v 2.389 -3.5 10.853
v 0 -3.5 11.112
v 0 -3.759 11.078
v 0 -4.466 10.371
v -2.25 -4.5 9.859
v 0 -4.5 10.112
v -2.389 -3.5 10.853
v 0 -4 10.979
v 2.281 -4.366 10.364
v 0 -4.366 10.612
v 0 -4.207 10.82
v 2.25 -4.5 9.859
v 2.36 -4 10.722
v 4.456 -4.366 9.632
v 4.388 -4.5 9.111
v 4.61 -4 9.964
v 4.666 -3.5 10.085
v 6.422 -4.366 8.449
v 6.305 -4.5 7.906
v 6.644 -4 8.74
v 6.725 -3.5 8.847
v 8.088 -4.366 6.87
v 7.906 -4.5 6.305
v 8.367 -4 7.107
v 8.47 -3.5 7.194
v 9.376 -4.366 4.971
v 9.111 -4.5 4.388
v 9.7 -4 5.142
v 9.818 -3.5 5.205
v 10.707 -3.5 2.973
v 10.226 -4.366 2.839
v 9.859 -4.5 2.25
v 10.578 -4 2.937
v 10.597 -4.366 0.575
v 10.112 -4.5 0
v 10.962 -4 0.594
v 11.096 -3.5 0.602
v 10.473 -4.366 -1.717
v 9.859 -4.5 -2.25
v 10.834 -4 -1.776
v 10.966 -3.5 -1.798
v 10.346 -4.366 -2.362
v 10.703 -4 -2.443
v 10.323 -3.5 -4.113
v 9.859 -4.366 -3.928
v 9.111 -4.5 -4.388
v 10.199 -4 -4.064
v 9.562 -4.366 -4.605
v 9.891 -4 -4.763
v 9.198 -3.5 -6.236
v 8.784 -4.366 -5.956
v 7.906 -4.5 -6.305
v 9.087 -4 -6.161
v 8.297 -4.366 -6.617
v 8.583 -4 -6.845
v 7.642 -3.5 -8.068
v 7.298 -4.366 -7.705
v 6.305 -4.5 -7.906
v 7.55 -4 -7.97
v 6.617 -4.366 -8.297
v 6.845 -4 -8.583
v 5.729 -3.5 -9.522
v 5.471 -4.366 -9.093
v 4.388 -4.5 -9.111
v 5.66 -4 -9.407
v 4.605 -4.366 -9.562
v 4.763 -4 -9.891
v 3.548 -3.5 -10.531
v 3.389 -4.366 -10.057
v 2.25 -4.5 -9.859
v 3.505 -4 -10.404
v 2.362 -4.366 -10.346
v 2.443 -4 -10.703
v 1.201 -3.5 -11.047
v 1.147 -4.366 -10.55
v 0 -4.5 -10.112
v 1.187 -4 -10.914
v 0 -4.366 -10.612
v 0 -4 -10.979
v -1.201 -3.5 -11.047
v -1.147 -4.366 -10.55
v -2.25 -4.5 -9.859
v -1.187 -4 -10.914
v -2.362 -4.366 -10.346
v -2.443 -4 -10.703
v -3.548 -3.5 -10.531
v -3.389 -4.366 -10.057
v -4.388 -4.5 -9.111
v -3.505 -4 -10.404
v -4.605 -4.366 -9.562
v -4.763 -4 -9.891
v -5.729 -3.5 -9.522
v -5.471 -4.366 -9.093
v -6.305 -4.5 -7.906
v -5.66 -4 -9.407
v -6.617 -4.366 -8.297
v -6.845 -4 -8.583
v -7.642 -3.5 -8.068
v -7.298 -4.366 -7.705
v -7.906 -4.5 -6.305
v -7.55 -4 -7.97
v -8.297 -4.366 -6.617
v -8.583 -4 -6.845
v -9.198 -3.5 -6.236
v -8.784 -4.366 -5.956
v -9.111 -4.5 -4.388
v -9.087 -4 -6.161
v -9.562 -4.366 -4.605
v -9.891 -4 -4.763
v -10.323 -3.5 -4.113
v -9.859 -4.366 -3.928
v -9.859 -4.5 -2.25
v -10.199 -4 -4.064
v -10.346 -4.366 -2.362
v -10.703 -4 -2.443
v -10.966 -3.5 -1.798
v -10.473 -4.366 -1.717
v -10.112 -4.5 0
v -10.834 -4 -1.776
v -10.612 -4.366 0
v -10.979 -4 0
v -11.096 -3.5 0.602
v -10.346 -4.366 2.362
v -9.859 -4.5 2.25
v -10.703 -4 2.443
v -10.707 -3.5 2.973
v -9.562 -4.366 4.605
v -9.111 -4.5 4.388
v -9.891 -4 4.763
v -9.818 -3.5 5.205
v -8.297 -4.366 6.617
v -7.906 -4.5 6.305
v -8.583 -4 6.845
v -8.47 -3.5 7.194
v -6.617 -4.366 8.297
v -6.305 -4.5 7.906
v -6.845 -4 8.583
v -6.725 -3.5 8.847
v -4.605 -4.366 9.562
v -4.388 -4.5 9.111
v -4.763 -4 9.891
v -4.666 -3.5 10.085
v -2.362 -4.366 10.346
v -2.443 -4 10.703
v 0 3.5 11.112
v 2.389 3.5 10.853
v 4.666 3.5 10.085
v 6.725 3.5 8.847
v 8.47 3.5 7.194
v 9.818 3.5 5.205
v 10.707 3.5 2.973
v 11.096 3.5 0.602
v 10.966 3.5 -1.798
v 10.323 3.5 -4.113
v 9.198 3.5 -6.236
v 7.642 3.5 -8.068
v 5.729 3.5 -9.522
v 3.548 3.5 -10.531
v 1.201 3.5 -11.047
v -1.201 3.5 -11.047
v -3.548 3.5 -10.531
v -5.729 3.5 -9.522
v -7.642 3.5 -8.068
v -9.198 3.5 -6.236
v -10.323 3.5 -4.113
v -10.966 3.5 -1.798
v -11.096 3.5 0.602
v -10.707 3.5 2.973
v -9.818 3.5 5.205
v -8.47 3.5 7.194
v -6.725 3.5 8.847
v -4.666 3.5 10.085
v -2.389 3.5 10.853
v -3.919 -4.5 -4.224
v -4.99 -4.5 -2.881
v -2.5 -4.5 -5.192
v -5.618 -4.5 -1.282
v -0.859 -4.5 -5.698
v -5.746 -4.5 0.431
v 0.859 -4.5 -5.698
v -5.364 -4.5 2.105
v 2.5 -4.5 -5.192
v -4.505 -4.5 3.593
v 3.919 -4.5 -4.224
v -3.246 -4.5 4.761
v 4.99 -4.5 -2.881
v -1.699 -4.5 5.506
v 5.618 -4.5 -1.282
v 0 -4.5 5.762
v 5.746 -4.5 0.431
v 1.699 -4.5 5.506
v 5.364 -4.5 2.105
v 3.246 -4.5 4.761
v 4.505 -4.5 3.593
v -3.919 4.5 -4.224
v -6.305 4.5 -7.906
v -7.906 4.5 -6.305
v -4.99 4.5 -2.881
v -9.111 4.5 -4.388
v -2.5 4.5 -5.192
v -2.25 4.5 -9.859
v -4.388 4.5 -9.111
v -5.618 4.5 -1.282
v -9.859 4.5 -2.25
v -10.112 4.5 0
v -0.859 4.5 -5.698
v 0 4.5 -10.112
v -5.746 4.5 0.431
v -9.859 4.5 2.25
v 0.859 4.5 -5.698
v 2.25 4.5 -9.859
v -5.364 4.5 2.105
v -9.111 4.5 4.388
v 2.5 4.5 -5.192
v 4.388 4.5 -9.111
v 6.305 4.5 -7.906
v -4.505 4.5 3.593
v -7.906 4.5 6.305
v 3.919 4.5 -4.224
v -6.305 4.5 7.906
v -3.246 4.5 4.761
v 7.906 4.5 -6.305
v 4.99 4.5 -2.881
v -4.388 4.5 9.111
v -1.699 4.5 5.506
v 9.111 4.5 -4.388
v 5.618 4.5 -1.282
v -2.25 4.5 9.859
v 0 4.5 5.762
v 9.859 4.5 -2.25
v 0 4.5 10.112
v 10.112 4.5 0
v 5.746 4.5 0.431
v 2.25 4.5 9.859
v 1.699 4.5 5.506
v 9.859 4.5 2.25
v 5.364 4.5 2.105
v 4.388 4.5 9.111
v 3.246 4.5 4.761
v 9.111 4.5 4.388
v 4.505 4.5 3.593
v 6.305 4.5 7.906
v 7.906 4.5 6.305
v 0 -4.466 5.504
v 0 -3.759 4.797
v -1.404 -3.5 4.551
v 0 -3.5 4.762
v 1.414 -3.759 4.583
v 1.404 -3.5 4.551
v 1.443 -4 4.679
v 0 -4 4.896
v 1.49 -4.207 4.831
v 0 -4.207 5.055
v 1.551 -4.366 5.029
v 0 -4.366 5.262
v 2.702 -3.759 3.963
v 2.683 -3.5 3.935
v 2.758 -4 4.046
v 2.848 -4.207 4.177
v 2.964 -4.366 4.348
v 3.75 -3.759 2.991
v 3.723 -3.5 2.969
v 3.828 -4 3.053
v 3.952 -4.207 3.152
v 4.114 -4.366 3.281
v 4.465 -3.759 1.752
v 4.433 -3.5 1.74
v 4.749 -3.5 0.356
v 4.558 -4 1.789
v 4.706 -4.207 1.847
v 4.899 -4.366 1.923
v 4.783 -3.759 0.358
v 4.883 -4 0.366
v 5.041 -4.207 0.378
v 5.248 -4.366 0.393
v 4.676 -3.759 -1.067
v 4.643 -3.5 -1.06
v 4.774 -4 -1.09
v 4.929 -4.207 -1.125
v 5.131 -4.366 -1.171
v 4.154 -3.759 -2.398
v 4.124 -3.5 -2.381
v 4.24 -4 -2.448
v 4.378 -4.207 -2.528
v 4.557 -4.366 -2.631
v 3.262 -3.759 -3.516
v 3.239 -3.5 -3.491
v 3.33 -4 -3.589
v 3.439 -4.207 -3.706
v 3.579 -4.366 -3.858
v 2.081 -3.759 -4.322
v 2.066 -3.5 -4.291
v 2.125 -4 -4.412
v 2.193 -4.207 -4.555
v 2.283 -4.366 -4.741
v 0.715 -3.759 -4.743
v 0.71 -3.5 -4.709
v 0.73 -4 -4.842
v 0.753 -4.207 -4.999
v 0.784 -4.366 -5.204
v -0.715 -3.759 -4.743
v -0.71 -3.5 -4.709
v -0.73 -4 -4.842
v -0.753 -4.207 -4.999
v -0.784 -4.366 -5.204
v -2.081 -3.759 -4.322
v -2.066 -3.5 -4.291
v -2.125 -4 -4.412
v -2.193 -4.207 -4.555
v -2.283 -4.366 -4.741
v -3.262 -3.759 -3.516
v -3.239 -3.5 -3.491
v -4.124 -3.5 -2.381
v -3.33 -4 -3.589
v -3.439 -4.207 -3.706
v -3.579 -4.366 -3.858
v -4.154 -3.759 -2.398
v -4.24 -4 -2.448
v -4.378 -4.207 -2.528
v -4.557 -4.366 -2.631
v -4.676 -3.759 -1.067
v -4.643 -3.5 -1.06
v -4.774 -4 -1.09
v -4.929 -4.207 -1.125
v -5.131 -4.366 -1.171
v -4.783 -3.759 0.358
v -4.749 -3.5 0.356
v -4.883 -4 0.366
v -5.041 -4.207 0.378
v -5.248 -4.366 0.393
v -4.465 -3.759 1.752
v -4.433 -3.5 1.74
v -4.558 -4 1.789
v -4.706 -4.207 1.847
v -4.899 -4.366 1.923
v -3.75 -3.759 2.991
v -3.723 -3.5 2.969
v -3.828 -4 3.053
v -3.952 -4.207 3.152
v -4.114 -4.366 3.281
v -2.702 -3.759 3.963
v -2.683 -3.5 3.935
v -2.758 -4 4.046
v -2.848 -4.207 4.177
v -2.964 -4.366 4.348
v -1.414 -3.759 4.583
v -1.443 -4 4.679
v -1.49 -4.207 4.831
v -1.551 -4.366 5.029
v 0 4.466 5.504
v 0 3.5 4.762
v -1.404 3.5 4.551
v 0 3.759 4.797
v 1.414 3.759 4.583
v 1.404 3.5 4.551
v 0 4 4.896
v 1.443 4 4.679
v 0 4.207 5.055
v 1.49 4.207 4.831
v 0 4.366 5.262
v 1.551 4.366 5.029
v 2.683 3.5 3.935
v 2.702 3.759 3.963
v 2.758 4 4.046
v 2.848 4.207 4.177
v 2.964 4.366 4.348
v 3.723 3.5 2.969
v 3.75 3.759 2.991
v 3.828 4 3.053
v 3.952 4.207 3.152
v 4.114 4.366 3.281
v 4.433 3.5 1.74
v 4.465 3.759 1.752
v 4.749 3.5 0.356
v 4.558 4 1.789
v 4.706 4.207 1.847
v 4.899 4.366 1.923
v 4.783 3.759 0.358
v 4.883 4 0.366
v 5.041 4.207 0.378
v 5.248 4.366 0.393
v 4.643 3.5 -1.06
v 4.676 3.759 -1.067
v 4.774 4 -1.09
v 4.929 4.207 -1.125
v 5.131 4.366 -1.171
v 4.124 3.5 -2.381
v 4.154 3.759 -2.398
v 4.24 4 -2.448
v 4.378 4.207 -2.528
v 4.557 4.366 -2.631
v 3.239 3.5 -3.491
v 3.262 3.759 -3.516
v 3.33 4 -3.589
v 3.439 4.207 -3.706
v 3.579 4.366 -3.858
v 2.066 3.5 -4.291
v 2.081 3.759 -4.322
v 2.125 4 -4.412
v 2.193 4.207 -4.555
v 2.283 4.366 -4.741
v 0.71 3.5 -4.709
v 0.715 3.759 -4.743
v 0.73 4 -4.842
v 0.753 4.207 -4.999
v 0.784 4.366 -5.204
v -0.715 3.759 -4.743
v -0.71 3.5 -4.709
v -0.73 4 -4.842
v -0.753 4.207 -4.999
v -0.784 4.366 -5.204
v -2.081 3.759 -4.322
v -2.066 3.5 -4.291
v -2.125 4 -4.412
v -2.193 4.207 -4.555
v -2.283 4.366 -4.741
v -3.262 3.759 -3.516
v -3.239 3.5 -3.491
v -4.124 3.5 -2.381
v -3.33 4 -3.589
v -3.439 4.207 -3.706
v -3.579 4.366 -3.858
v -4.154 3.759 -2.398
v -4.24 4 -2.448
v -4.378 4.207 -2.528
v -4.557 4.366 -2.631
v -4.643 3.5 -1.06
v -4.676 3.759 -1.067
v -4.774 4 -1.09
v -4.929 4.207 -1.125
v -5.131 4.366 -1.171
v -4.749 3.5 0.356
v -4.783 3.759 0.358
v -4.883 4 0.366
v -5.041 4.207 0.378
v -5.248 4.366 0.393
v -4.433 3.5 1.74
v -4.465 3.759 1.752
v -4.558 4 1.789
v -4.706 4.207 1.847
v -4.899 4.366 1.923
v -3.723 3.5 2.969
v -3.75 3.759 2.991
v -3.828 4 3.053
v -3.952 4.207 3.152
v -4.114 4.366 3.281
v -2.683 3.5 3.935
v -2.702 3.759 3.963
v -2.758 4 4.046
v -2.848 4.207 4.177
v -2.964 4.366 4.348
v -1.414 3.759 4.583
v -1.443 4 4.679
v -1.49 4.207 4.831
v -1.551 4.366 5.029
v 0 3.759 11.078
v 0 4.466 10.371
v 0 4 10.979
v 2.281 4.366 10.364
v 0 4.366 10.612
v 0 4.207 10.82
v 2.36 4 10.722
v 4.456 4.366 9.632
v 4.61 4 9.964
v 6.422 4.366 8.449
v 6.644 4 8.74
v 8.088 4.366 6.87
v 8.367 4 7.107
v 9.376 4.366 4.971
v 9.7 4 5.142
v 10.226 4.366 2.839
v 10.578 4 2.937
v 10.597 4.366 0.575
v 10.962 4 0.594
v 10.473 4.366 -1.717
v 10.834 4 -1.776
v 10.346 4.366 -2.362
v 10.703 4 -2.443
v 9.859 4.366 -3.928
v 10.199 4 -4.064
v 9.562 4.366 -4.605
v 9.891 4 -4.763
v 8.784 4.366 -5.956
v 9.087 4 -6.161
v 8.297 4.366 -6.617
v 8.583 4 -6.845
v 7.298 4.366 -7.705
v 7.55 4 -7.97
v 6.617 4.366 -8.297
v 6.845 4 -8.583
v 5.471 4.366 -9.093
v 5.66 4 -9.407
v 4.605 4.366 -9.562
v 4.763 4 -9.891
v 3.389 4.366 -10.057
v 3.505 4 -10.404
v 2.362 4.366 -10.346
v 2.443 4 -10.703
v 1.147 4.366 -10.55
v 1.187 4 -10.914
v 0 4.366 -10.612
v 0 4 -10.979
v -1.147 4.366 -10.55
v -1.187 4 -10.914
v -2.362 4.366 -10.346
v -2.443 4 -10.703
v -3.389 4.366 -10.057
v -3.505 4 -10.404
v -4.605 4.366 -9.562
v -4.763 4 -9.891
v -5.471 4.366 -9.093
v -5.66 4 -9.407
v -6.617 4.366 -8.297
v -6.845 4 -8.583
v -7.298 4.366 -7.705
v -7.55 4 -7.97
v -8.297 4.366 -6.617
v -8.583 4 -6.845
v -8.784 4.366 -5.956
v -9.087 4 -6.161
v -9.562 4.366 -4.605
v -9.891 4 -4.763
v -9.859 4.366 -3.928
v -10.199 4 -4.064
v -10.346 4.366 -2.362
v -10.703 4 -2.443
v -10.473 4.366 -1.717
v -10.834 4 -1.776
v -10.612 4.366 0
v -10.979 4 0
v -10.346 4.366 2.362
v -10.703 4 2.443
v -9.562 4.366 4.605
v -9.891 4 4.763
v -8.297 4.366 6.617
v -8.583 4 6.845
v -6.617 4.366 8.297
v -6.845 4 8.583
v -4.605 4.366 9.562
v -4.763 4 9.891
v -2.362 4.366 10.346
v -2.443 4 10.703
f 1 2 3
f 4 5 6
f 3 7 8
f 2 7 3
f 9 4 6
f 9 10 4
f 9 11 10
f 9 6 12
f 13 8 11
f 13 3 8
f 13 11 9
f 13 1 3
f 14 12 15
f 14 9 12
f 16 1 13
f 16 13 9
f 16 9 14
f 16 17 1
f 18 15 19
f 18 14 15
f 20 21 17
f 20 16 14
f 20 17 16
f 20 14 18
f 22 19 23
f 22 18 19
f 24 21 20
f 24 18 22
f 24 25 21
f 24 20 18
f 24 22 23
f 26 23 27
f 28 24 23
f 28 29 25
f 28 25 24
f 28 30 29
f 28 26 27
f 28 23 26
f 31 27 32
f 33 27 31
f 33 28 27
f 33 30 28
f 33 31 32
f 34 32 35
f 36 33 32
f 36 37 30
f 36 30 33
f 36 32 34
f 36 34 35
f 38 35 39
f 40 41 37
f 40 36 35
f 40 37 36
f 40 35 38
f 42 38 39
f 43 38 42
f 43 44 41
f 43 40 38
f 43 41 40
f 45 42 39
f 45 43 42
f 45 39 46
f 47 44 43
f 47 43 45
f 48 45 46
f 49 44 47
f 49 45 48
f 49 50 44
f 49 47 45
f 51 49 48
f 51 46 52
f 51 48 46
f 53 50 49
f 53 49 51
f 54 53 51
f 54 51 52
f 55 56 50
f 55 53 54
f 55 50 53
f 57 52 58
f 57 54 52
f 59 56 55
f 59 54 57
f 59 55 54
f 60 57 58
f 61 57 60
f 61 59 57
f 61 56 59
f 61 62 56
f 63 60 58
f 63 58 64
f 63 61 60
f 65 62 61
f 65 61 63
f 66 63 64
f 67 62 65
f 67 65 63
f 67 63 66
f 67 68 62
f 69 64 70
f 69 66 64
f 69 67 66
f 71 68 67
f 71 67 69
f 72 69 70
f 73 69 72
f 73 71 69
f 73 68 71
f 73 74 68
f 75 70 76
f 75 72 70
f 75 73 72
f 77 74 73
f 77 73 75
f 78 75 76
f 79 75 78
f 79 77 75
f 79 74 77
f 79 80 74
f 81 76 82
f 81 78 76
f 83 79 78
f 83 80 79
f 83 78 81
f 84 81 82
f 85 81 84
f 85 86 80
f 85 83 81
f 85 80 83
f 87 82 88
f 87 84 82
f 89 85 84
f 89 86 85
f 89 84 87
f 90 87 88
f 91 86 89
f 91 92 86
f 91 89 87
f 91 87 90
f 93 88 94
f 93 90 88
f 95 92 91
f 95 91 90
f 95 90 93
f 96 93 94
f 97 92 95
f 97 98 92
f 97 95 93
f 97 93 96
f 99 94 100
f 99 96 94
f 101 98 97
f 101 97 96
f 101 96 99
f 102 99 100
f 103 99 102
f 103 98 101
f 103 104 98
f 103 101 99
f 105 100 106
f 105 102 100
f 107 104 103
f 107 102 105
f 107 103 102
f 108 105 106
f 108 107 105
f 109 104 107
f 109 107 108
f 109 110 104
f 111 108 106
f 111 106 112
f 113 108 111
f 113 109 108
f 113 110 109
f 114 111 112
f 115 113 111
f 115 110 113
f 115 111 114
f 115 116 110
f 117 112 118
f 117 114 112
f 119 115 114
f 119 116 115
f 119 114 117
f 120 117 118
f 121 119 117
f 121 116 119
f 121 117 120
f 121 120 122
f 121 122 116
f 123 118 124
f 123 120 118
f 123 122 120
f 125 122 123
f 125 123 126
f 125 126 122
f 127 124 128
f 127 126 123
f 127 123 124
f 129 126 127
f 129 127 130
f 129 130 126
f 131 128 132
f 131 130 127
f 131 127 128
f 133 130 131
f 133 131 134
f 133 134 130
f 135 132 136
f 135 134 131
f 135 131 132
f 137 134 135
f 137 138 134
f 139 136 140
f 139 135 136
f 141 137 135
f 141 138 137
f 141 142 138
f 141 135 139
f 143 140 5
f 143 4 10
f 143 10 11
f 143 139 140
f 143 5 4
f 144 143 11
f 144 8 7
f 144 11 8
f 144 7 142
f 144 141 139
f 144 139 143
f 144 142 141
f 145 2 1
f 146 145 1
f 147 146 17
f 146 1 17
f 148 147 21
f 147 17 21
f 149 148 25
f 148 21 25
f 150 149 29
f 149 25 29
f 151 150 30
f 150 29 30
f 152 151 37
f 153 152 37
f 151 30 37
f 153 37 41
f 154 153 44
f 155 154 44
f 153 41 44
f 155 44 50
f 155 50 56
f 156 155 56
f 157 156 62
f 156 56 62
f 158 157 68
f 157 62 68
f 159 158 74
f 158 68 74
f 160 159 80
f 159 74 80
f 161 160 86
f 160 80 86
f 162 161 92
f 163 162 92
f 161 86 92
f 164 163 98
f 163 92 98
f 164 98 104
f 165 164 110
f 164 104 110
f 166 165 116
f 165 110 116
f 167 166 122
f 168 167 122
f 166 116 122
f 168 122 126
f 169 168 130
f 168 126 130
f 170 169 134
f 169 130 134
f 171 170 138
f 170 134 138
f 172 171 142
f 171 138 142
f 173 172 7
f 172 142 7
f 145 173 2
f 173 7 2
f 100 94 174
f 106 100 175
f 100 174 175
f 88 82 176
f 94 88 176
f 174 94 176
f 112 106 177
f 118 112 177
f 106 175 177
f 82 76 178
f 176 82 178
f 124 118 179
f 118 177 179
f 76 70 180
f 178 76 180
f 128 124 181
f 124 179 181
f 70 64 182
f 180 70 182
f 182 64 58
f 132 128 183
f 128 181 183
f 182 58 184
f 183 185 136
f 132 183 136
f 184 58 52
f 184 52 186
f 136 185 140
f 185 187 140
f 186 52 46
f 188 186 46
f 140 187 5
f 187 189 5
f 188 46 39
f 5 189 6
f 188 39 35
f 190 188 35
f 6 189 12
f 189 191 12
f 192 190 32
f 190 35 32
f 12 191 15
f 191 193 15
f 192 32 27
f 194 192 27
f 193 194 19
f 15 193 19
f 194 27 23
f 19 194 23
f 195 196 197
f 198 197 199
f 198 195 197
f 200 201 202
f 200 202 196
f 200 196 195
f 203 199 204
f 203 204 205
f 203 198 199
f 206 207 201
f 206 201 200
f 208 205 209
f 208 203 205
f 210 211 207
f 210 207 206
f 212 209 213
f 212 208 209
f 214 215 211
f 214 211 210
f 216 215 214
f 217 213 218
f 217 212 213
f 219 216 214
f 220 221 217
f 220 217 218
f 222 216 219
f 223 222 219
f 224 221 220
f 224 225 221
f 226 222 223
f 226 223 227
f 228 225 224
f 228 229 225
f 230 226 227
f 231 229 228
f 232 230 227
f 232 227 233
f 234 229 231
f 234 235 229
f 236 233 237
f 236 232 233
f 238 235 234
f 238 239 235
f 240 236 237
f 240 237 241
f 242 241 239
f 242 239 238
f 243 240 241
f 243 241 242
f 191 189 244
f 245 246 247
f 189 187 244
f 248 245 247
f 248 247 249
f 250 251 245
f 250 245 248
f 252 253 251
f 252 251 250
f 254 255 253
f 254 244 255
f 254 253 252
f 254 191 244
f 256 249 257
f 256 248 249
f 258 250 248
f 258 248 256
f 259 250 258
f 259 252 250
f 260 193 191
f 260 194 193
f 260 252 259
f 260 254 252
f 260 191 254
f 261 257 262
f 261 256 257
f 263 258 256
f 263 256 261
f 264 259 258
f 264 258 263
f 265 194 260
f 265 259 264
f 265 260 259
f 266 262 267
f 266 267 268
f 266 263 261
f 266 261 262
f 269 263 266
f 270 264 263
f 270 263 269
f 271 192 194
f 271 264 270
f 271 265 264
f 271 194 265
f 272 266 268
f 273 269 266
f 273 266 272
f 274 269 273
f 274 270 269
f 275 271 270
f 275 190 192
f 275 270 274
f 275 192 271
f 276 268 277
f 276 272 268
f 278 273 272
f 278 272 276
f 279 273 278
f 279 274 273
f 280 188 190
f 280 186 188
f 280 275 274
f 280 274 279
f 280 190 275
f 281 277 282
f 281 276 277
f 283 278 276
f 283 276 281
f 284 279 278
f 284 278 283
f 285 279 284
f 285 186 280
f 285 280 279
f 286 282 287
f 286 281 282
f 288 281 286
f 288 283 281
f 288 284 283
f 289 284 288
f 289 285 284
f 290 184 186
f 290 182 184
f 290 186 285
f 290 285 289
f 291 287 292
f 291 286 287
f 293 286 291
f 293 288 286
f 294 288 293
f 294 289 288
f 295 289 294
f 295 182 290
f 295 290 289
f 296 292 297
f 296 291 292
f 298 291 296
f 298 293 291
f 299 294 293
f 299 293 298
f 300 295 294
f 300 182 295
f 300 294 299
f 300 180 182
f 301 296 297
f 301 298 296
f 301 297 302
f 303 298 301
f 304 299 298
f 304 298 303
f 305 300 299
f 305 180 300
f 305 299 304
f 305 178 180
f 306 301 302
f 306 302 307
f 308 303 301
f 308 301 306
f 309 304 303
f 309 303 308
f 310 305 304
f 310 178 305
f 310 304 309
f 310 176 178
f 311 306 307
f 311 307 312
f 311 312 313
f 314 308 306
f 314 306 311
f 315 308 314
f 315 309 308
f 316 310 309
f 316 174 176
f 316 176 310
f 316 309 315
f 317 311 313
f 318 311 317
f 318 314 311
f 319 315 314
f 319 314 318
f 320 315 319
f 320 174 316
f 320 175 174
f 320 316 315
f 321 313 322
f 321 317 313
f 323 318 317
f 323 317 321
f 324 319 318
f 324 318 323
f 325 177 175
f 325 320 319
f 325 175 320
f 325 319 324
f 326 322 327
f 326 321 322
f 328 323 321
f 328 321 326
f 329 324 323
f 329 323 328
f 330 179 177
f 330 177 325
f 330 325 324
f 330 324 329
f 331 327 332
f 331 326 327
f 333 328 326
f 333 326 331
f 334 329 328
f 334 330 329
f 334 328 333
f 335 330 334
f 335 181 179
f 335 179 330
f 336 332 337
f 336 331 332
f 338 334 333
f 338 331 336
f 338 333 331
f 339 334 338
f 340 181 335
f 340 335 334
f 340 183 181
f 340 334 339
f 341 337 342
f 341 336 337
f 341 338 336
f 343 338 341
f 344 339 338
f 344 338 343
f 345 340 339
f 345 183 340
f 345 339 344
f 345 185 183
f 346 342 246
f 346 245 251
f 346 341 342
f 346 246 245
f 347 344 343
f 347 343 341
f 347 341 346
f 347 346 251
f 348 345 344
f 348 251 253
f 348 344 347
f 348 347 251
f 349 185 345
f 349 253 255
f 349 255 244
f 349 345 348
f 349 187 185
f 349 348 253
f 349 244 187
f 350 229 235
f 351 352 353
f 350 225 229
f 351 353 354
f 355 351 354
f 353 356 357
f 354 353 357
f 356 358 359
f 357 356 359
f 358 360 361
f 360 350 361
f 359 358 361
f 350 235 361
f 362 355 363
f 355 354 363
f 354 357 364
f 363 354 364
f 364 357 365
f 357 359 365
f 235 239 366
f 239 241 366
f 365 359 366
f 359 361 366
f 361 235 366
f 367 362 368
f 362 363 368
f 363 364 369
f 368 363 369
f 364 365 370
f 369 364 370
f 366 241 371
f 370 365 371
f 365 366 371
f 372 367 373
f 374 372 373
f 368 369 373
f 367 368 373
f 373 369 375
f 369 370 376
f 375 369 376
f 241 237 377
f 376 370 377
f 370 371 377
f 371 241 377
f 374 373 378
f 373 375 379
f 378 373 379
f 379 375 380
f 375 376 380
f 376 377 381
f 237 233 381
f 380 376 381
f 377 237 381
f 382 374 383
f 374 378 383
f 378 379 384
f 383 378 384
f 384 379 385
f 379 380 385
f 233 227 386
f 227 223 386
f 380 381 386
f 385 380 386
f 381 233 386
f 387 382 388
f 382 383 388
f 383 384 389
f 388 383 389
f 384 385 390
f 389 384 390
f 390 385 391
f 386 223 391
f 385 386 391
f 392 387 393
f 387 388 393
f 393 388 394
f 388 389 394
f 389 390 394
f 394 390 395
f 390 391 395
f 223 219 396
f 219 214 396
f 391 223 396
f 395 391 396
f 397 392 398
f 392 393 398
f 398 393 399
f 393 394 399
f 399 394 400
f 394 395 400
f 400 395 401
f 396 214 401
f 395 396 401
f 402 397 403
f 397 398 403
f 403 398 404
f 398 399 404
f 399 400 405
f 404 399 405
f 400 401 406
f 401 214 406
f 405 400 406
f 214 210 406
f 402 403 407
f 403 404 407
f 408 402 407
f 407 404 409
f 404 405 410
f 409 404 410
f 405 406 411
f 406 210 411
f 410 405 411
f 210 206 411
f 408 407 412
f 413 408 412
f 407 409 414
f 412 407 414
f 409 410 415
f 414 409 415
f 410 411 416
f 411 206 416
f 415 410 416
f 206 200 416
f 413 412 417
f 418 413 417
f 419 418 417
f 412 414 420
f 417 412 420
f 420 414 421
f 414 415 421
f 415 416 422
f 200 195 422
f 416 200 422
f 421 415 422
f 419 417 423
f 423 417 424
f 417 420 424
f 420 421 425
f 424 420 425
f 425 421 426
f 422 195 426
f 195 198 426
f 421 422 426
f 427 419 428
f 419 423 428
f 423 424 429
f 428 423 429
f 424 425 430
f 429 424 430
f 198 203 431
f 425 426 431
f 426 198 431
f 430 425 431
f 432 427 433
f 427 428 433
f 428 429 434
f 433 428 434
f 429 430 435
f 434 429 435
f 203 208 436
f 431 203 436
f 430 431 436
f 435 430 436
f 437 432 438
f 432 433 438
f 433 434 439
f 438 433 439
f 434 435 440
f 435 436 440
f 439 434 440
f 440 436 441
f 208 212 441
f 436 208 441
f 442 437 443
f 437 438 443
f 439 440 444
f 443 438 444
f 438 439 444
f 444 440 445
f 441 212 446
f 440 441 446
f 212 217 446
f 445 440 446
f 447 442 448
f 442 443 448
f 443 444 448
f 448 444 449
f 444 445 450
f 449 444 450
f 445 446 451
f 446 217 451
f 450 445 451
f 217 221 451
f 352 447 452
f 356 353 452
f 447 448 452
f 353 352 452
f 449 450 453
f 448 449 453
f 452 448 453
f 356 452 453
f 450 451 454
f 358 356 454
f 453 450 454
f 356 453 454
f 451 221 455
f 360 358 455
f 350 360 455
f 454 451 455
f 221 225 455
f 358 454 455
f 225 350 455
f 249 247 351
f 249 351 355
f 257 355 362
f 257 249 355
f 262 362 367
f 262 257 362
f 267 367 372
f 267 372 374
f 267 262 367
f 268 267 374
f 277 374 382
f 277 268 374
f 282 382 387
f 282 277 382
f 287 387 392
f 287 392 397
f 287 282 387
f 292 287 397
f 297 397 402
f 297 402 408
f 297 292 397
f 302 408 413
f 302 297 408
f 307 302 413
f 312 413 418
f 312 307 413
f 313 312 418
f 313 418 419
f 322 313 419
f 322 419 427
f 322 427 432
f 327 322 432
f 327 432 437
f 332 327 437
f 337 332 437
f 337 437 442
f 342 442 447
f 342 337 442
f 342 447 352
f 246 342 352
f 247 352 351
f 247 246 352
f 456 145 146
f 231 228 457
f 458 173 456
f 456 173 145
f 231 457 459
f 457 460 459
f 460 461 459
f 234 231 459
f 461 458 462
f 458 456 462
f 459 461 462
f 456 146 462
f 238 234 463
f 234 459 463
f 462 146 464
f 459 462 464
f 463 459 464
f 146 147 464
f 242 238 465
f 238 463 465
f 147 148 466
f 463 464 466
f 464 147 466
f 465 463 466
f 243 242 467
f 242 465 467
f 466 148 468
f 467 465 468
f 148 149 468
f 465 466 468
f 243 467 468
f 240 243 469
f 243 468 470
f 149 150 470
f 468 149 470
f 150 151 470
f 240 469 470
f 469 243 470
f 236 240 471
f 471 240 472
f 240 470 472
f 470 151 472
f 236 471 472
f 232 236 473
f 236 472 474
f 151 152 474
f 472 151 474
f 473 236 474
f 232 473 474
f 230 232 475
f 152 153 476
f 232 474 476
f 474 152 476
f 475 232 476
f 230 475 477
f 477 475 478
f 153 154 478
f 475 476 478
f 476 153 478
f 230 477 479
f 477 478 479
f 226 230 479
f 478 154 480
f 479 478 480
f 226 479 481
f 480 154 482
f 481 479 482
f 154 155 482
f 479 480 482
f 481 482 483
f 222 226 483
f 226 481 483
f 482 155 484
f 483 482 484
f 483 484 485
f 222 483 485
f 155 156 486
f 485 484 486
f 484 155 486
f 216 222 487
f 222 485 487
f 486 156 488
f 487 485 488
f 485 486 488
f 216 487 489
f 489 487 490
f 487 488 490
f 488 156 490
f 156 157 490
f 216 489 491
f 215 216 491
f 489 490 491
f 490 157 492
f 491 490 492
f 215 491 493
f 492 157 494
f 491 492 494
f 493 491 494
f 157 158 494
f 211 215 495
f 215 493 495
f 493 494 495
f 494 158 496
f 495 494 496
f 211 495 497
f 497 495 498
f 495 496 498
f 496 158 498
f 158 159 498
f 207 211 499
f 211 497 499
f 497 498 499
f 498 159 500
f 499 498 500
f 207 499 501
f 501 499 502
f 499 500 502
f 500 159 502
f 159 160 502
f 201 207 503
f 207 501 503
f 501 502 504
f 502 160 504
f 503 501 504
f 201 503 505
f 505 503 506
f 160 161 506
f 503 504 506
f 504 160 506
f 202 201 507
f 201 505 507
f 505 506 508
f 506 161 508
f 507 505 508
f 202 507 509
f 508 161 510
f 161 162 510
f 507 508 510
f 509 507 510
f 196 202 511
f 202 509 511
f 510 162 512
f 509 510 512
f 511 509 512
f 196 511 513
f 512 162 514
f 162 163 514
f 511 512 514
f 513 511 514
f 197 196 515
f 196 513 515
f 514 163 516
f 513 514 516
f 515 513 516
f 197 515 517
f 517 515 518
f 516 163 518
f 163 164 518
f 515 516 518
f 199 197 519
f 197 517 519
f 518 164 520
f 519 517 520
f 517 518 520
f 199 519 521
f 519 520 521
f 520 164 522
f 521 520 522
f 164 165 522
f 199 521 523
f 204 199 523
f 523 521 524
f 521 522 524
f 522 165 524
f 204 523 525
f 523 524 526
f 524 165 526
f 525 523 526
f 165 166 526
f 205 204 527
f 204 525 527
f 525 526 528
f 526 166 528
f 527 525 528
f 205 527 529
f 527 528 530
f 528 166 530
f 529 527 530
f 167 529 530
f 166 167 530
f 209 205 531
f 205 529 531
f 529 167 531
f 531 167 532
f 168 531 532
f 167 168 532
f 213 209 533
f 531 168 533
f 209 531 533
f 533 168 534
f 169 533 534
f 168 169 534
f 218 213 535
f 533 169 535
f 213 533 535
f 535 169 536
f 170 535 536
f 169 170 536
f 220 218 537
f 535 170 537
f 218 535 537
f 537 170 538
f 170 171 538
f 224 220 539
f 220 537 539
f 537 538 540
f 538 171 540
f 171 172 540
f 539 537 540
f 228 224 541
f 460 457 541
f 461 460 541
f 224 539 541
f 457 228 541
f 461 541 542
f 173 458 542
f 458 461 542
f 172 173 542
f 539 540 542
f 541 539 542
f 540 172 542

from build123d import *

# Parameters (mm, degrees)
BOSS_EXTRUDE1_DEPTH      = 4.5
BOSS_EXTRUDE1_DEPTH_BACK = 4.5
SKETCH1_R                = 11.1125
SKETCH1_R_2              = 4.7625
FILLET1_R                = 1
FILLET2_R                = 1


with BuildPart() as part:
    # Sketch1 → Boss-Extrude1 (new, two sides: drawn at the far end of the back side and taken through both)
    with BuildSketch(Plane(origin=(0, 0, 0), x_dir=(1, 0, 0), z_dir=(0, 1, 0)).offset(-BOSS_EXTRUDE1_DEPTH_BACK)):
        Circle(SKETCH1_R)
        Circle(SKETCH1_R_2, mode=Mode.SUBTRACT)
    extrude(amount=BOSS_EXTRUDE1_DEPTH + BOSS_EXTRUDE1_DEPTH_BACK)

    # Fillet1
    fillet1_edges = [part.edges().sort_by_distance(p)[0] for p in [
        (-4.7625, -4.5, 0),
        (-4.7625, 4.5, 0),
    ]]
    fillet(fillet1_edges, radius=FILLET1_R)

    # Fillet2
    fillet2_edges = [part.edges().sort_by_distance(p)[0] for p in [
        (-11.1125, 4.5, 0),
        (-11.1125, -4.5, 0),
    ]]
    fillet(fillet2_edges, radius=FILLET2_R)


solid = part.part
